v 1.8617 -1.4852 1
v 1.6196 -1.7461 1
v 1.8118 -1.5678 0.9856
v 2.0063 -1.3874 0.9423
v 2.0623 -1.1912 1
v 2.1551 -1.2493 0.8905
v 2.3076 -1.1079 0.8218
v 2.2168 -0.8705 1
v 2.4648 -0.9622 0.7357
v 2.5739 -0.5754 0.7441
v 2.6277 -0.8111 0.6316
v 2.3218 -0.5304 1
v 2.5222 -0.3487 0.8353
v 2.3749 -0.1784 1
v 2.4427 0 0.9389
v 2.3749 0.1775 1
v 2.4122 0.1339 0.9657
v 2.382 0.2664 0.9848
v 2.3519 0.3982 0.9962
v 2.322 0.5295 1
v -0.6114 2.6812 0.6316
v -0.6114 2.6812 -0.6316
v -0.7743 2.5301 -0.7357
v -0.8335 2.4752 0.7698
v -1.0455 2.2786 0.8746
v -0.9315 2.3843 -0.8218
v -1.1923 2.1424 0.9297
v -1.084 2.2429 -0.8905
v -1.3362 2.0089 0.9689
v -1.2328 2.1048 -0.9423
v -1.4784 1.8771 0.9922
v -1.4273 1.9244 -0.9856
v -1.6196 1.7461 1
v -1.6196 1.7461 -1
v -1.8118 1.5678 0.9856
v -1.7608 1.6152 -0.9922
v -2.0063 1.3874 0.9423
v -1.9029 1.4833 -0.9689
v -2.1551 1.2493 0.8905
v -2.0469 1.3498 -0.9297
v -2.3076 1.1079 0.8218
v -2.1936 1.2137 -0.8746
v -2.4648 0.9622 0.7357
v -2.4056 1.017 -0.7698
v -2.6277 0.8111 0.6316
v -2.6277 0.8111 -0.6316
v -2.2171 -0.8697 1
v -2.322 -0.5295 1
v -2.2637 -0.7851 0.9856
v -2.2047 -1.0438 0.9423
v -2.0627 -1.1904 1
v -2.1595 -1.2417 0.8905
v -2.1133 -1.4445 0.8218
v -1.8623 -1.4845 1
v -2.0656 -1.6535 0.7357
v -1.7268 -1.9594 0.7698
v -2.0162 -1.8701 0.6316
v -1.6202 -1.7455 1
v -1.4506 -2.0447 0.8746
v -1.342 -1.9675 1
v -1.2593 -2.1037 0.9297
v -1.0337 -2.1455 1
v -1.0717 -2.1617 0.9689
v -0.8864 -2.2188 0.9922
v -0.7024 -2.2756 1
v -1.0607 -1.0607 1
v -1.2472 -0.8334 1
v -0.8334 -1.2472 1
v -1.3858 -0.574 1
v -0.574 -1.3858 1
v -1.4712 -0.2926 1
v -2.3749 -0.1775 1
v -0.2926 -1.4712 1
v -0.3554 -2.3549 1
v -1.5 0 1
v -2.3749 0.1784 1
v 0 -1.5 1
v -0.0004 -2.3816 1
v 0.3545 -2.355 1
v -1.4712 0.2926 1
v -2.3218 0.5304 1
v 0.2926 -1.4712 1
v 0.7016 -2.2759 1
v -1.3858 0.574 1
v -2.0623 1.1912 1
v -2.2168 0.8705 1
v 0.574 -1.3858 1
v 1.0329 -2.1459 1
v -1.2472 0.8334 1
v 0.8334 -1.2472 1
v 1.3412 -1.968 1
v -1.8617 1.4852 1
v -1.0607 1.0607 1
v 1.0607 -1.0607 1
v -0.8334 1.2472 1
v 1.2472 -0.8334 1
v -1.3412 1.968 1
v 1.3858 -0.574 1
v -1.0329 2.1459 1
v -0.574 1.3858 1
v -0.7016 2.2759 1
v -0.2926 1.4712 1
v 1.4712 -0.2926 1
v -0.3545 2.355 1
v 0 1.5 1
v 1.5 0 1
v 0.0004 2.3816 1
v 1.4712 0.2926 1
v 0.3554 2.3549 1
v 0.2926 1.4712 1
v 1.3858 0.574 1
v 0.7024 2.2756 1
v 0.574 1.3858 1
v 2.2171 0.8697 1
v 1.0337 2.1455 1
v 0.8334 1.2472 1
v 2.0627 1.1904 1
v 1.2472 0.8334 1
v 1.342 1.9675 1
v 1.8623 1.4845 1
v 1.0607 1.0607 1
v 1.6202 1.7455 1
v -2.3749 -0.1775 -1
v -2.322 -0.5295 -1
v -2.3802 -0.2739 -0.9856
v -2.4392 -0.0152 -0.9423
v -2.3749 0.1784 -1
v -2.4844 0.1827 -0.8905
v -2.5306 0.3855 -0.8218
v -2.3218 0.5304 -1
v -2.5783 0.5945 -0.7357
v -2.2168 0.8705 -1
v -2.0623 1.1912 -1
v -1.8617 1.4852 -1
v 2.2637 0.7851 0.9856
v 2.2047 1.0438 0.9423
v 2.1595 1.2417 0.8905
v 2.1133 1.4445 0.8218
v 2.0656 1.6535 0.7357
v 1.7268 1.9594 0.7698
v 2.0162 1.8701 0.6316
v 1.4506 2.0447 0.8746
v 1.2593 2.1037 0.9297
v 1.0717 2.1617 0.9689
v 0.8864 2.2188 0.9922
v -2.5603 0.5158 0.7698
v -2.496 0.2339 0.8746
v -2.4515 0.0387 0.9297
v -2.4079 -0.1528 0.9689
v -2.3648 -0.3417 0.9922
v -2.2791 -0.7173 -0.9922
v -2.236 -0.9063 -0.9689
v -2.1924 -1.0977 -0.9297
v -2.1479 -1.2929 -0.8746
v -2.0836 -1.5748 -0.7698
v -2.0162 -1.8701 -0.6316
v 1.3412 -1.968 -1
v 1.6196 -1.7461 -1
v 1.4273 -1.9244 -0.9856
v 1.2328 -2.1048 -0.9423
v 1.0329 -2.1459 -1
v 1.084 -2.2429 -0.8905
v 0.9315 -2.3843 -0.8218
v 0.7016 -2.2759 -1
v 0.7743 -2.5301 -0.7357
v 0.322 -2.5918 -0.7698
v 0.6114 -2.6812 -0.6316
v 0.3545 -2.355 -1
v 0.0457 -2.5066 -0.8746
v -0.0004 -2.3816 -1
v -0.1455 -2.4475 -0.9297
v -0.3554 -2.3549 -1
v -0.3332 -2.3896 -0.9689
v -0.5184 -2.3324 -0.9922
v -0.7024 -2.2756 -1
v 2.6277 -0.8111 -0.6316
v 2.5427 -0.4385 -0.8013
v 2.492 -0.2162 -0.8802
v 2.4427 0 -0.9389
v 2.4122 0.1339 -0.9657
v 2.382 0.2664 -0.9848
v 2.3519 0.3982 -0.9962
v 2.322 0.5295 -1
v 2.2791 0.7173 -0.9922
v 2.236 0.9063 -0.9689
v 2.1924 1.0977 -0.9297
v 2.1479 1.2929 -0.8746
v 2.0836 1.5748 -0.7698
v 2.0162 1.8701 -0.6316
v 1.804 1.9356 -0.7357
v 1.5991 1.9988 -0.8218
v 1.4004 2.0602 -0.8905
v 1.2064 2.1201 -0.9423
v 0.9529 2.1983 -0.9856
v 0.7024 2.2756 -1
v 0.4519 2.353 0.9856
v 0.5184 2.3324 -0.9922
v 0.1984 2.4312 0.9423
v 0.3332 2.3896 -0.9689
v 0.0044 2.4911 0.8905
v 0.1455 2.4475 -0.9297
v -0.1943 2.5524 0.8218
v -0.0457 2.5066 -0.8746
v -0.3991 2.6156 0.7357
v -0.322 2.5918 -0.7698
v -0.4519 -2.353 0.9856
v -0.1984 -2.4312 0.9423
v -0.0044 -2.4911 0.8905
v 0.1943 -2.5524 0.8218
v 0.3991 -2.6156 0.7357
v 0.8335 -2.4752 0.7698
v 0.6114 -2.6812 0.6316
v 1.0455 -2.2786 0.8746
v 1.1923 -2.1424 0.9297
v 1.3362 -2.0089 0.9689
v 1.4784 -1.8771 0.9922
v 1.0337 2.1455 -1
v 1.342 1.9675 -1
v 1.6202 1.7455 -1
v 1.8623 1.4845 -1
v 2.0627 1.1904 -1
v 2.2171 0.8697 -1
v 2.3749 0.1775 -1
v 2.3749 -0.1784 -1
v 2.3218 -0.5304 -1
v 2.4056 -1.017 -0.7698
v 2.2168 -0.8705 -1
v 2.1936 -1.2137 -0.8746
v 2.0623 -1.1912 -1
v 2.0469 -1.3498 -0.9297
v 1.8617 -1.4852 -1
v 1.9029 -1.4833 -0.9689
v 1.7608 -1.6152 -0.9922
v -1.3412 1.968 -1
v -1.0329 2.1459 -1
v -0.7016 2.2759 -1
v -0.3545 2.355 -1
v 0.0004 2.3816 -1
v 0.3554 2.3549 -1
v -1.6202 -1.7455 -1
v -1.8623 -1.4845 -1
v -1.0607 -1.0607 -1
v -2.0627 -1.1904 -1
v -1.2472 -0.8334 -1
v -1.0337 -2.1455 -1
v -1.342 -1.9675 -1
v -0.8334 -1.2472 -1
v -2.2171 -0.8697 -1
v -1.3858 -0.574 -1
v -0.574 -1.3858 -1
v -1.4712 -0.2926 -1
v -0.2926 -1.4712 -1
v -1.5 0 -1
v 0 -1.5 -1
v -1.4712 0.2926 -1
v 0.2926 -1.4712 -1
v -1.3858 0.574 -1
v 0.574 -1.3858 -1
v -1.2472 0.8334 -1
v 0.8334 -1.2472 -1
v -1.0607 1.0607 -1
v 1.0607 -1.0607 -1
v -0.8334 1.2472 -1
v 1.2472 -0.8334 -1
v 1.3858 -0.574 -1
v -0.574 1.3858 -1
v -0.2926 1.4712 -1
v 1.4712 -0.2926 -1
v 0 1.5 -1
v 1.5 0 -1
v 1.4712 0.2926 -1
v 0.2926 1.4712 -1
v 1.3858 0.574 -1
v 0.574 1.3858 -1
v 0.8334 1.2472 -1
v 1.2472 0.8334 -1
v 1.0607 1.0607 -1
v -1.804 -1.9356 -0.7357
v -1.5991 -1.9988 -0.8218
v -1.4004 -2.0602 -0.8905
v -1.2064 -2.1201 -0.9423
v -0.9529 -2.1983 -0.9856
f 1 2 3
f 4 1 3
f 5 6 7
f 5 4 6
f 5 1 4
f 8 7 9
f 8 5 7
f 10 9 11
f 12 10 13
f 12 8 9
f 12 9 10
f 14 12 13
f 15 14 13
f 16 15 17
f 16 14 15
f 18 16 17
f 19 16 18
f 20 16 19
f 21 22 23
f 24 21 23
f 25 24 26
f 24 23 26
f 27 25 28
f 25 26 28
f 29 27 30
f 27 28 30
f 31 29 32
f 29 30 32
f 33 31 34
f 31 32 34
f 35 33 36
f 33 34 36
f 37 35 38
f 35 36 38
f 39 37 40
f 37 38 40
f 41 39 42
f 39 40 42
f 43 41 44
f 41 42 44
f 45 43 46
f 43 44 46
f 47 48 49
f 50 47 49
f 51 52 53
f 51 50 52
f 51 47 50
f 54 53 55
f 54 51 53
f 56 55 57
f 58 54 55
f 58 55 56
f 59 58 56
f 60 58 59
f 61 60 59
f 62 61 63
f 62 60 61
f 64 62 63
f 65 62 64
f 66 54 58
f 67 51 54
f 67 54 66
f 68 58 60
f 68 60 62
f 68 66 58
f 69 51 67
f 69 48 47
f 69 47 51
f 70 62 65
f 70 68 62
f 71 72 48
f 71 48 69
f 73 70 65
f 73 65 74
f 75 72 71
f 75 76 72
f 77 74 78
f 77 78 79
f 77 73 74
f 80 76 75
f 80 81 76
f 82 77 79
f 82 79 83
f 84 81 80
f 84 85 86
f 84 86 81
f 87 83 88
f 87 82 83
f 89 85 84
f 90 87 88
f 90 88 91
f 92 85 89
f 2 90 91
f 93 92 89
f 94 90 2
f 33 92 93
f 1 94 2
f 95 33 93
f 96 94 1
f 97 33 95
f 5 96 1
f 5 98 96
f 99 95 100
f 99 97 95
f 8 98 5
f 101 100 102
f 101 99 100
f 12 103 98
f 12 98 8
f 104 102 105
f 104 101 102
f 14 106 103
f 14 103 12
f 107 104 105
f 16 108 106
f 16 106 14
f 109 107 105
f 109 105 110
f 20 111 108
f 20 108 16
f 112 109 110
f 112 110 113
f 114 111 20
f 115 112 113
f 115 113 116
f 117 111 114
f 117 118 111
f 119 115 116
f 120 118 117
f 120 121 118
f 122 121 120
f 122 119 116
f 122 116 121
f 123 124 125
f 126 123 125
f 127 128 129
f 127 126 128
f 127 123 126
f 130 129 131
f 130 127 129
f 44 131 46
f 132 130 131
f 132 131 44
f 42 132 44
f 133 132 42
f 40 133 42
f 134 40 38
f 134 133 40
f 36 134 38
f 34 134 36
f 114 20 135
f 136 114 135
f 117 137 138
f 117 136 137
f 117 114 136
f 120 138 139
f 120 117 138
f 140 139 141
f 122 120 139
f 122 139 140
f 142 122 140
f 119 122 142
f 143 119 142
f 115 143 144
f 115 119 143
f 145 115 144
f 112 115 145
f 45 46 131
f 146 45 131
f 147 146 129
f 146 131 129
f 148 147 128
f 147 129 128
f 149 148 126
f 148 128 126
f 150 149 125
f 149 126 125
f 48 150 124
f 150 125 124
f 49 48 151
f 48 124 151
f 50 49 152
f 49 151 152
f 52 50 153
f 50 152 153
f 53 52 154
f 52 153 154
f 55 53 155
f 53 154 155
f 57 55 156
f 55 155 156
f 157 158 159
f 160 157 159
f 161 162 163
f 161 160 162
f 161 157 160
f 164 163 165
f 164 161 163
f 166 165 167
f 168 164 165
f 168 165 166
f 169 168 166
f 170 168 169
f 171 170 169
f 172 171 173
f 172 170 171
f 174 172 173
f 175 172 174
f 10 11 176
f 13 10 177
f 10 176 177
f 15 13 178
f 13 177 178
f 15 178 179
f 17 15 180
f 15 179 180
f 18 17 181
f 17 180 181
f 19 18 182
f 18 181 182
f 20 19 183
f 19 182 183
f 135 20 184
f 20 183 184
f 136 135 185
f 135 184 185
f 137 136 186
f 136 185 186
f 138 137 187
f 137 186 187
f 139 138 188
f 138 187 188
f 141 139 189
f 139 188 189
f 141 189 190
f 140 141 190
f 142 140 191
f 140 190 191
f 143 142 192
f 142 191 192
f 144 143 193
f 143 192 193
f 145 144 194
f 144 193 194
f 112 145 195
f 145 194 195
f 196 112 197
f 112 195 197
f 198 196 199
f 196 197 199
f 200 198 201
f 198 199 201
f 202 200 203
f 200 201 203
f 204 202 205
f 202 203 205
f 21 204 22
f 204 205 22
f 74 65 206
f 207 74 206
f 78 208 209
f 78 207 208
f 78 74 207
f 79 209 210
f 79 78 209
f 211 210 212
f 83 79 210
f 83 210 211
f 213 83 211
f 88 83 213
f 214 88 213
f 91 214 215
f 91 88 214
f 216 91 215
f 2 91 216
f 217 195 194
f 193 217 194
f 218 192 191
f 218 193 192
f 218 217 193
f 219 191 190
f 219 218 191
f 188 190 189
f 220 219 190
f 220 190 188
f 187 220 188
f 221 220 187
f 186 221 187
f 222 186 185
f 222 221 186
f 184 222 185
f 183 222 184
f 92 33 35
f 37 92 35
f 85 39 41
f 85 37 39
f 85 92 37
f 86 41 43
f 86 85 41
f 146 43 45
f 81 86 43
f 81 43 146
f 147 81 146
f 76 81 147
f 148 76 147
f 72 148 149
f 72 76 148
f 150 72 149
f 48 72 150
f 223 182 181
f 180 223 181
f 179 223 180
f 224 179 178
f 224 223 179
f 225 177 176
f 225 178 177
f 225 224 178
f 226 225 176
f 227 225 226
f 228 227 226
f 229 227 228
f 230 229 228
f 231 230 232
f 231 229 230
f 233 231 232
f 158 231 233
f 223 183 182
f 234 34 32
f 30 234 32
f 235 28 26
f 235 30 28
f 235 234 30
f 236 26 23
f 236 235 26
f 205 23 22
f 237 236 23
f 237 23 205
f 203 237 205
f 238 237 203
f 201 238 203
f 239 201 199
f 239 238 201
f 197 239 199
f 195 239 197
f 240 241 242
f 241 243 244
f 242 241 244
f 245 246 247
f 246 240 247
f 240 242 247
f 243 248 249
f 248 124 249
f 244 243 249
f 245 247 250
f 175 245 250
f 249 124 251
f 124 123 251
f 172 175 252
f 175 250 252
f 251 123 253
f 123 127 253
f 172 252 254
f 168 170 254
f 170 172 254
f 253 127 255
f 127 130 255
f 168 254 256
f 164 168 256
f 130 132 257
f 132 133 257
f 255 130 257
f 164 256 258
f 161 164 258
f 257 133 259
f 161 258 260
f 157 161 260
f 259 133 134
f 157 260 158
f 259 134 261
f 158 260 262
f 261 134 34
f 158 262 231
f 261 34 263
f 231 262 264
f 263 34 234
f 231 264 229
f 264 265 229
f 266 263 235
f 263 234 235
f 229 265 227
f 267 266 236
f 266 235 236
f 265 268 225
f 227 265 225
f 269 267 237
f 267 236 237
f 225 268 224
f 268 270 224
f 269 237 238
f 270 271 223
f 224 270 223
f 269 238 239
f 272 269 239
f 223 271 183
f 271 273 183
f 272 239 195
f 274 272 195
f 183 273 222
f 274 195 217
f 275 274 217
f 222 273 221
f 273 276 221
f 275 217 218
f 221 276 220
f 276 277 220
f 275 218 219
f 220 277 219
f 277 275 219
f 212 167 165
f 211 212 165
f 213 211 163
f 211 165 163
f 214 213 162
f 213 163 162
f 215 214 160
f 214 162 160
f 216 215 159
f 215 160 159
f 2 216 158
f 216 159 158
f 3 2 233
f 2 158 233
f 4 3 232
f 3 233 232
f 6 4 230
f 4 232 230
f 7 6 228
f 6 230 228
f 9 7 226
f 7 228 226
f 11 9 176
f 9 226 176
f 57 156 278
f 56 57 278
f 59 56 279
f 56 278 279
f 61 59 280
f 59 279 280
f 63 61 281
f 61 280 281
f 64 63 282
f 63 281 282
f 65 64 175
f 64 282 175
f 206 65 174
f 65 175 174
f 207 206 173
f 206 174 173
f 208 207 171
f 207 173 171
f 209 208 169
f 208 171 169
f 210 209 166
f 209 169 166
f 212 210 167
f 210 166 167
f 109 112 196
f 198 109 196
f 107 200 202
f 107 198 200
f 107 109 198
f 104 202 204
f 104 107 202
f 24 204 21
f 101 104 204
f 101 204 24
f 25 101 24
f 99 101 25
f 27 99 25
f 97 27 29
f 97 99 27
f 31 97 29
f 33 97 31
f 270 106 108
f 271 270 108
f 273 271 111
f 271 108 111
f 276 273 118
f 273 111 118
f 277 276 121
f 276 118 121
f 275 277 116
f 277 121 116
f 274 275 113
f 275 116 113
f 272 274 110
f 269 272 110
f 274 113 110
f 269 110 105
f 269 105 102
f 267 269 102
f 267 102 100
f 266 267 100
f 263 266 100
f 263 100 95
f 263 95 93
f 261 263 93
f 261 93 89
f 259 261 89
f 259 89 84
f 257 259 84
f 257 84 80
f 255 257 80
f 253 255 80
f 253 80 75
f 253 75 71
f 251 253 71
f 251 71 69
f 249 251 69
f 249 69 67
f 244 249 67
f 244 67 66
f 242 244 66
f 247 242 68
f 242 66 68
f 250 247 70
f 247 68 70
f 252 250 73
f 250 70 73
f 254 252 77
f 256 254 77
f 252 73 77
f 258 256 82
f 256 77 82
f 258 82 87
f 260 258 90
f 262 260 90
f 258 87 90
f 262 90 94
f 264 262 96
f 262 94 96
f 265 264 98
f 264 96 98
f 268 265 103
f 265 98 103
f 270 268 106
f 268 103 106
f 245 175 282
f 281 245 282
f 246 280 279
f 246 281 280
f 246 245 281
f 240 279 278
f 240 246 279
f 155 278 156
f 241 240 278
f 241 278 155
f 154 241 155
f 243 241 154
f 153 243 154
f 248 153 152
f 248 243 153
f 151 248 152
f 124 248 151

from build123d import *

# Parameters (mm, degrees)
BOSS_EXTRUDE1_DEPTH      = 1
BOSS_EXTRUDE1_DEPTH_BACK = 1
CUT_EXTRUDE1_REACH       = 6.254
SKETCH2_R                = 1.5
SKETCH19_OUTSIDE_W       = 10.31
SKETCH19_OUTSIDE_H       = 10.416
SKETCH19_OUTSIDE_R       = 2.38156986
CUT_EXTRUDE7_DEPTH       = 0.75
CUT_EXTRUDE7_DRAFT       = -45
MIRROR1_COPY_1_SKETCH_W  = 10.31
MIRROR1_COPY_1_SKETCH_H  = 10.416
MIRROR1_COPY_1_SKETCH_R  = 2.38156986
MIRROR1_COPY_1_DEPTH     = 0.75
MIRROR1_COPY_1_DRAFT     = -45


with BuildPart() as part:
    # Sketch1 → Boss-Extrude1 (new, two sides: drawn at the far end of the back side and taken through both)
    with BuildSketch(Plane.XY.offset(-BOSS_EXTRUDE1_DEPTH_BACK)):
        Polygon((2.627673365, -0.811068855), (2.016242915, 1.87009746), (-0.61143045, 2.681166314), (-2.627673365, 0.811068855), (-2.016242915, -1.87009746), (0.61143045, -2.681166314), align=None)
    extrude(amount=BOSS_EXTRUDE1_DEPTH + BOSS_EXTRUDE1_DEPTH_BACK)

    # Sketch2 → Cut-Extrude1 (cut, up to next)
    with BuildSketch(Plane.XY.offset(1), mode=Mode.PRIVATE) as cut_extrude1_sk1:
        Circle(SKETCH2_R)
    cut_extrude1_tool1 = extrude(cut_extrude1_sk1.sketch, amount=-CUT_EXTRUDE1_REACH, mode=Mode.PRIVATE) & part.part
    add(cut_extrude1_tool1.solids().sort_by_distance((0, 0, 1))[0], mode=Mode.SUBTRACT)


with BuildPart() as cut_extrude7_tool:
    # Sketch19 outside → Cut-Extrude7 (with draft: the straight prism first)
    with BuildSketch(Plane.XY.offset(1)):
        Rectangle(SKETCH19_OUTSIDE_W, SKETCH19_OUTSIDE_H)
        Circle(SKETCH19_OUTSIDE_R, mode=Mode.SUBTRACT)
    extrude(amount=-CUT_EXTRUDE7_DEPTH)
    # Cut-Extrude7: the draft: its side faces are tilted about the plane it starts from
    cut_extrude7_sides = [cut_extrude7_tool.faces().sort_by_distance(p)[0] for p in [
        (0, -5.208, 0.625),
        (5.155, 0, 0.625),
        (0, 5.208, 0.625),
        (-5.155, 0, 0.625),
        (-2.38156986, 0, 0.625),
    ]]
    draft(cut_extrude7_sides, Plane.XY.offset(1), CUT_EXTRUDE7_DRAFT)


with BuildPart() as part_1:
    add(part.part)

    # Cut-Extrude7: cut by cut_extrude7_tool
    add(cut_extrude7_tool.part, mode=Mode.SUBTRACT)


with BuildPart() as mirror1_copy_1_tool:
    # Mirror1 copy 1 sketch → Mirror1 copy 1 (with draft: the straight prism first)
    with BuildSketch(Plane(origin=(0, 0, -1), x_dir=(1, 0, 0), z_dir=(0, 0, -1))):
        Rectangle(MIRROR1_COPY_1_SKETCH_W, MIRROR1_COPY_1_SKETCH_H)
        Circle(MIRROR1_COPY_1_SKETCH_R, mode=Mode.SUBTRACT)
    extrude(amount=-MIRROR1_COPY_1_DEPTH)
    # Mirror1 copy 1: the draft: its side faces are tilted about the plane it starts from
    mirror1_copy_1_sides = [mirror1_copy_1_tool.faces().sort_by_distance(p)[0] for p in [
        (0, -5.208, -0.625),
        (5.155, 0, -0.625),
        (0, 5.208, -0.625),
        (-5.155, 0, -0.625),
        (-2.38156986, 0, -0.625),
    ]]
    draft(mirror1_copy_1_sides, Plane(origin=(0, 0, -1), x_dir=(1, 0, 0), z_dir=(0, 0, -1)), MIRROR1_COPY_1_DRAFT)


with BuildPart() as part_2:
    add(part_1.part)

    # Mirror1 copy 1: cut by mirror1_copy_1_tool
    add(mirror1_copy_1_tool.part, mode=Mode.SUBTRACT)


solid = part_2.part
